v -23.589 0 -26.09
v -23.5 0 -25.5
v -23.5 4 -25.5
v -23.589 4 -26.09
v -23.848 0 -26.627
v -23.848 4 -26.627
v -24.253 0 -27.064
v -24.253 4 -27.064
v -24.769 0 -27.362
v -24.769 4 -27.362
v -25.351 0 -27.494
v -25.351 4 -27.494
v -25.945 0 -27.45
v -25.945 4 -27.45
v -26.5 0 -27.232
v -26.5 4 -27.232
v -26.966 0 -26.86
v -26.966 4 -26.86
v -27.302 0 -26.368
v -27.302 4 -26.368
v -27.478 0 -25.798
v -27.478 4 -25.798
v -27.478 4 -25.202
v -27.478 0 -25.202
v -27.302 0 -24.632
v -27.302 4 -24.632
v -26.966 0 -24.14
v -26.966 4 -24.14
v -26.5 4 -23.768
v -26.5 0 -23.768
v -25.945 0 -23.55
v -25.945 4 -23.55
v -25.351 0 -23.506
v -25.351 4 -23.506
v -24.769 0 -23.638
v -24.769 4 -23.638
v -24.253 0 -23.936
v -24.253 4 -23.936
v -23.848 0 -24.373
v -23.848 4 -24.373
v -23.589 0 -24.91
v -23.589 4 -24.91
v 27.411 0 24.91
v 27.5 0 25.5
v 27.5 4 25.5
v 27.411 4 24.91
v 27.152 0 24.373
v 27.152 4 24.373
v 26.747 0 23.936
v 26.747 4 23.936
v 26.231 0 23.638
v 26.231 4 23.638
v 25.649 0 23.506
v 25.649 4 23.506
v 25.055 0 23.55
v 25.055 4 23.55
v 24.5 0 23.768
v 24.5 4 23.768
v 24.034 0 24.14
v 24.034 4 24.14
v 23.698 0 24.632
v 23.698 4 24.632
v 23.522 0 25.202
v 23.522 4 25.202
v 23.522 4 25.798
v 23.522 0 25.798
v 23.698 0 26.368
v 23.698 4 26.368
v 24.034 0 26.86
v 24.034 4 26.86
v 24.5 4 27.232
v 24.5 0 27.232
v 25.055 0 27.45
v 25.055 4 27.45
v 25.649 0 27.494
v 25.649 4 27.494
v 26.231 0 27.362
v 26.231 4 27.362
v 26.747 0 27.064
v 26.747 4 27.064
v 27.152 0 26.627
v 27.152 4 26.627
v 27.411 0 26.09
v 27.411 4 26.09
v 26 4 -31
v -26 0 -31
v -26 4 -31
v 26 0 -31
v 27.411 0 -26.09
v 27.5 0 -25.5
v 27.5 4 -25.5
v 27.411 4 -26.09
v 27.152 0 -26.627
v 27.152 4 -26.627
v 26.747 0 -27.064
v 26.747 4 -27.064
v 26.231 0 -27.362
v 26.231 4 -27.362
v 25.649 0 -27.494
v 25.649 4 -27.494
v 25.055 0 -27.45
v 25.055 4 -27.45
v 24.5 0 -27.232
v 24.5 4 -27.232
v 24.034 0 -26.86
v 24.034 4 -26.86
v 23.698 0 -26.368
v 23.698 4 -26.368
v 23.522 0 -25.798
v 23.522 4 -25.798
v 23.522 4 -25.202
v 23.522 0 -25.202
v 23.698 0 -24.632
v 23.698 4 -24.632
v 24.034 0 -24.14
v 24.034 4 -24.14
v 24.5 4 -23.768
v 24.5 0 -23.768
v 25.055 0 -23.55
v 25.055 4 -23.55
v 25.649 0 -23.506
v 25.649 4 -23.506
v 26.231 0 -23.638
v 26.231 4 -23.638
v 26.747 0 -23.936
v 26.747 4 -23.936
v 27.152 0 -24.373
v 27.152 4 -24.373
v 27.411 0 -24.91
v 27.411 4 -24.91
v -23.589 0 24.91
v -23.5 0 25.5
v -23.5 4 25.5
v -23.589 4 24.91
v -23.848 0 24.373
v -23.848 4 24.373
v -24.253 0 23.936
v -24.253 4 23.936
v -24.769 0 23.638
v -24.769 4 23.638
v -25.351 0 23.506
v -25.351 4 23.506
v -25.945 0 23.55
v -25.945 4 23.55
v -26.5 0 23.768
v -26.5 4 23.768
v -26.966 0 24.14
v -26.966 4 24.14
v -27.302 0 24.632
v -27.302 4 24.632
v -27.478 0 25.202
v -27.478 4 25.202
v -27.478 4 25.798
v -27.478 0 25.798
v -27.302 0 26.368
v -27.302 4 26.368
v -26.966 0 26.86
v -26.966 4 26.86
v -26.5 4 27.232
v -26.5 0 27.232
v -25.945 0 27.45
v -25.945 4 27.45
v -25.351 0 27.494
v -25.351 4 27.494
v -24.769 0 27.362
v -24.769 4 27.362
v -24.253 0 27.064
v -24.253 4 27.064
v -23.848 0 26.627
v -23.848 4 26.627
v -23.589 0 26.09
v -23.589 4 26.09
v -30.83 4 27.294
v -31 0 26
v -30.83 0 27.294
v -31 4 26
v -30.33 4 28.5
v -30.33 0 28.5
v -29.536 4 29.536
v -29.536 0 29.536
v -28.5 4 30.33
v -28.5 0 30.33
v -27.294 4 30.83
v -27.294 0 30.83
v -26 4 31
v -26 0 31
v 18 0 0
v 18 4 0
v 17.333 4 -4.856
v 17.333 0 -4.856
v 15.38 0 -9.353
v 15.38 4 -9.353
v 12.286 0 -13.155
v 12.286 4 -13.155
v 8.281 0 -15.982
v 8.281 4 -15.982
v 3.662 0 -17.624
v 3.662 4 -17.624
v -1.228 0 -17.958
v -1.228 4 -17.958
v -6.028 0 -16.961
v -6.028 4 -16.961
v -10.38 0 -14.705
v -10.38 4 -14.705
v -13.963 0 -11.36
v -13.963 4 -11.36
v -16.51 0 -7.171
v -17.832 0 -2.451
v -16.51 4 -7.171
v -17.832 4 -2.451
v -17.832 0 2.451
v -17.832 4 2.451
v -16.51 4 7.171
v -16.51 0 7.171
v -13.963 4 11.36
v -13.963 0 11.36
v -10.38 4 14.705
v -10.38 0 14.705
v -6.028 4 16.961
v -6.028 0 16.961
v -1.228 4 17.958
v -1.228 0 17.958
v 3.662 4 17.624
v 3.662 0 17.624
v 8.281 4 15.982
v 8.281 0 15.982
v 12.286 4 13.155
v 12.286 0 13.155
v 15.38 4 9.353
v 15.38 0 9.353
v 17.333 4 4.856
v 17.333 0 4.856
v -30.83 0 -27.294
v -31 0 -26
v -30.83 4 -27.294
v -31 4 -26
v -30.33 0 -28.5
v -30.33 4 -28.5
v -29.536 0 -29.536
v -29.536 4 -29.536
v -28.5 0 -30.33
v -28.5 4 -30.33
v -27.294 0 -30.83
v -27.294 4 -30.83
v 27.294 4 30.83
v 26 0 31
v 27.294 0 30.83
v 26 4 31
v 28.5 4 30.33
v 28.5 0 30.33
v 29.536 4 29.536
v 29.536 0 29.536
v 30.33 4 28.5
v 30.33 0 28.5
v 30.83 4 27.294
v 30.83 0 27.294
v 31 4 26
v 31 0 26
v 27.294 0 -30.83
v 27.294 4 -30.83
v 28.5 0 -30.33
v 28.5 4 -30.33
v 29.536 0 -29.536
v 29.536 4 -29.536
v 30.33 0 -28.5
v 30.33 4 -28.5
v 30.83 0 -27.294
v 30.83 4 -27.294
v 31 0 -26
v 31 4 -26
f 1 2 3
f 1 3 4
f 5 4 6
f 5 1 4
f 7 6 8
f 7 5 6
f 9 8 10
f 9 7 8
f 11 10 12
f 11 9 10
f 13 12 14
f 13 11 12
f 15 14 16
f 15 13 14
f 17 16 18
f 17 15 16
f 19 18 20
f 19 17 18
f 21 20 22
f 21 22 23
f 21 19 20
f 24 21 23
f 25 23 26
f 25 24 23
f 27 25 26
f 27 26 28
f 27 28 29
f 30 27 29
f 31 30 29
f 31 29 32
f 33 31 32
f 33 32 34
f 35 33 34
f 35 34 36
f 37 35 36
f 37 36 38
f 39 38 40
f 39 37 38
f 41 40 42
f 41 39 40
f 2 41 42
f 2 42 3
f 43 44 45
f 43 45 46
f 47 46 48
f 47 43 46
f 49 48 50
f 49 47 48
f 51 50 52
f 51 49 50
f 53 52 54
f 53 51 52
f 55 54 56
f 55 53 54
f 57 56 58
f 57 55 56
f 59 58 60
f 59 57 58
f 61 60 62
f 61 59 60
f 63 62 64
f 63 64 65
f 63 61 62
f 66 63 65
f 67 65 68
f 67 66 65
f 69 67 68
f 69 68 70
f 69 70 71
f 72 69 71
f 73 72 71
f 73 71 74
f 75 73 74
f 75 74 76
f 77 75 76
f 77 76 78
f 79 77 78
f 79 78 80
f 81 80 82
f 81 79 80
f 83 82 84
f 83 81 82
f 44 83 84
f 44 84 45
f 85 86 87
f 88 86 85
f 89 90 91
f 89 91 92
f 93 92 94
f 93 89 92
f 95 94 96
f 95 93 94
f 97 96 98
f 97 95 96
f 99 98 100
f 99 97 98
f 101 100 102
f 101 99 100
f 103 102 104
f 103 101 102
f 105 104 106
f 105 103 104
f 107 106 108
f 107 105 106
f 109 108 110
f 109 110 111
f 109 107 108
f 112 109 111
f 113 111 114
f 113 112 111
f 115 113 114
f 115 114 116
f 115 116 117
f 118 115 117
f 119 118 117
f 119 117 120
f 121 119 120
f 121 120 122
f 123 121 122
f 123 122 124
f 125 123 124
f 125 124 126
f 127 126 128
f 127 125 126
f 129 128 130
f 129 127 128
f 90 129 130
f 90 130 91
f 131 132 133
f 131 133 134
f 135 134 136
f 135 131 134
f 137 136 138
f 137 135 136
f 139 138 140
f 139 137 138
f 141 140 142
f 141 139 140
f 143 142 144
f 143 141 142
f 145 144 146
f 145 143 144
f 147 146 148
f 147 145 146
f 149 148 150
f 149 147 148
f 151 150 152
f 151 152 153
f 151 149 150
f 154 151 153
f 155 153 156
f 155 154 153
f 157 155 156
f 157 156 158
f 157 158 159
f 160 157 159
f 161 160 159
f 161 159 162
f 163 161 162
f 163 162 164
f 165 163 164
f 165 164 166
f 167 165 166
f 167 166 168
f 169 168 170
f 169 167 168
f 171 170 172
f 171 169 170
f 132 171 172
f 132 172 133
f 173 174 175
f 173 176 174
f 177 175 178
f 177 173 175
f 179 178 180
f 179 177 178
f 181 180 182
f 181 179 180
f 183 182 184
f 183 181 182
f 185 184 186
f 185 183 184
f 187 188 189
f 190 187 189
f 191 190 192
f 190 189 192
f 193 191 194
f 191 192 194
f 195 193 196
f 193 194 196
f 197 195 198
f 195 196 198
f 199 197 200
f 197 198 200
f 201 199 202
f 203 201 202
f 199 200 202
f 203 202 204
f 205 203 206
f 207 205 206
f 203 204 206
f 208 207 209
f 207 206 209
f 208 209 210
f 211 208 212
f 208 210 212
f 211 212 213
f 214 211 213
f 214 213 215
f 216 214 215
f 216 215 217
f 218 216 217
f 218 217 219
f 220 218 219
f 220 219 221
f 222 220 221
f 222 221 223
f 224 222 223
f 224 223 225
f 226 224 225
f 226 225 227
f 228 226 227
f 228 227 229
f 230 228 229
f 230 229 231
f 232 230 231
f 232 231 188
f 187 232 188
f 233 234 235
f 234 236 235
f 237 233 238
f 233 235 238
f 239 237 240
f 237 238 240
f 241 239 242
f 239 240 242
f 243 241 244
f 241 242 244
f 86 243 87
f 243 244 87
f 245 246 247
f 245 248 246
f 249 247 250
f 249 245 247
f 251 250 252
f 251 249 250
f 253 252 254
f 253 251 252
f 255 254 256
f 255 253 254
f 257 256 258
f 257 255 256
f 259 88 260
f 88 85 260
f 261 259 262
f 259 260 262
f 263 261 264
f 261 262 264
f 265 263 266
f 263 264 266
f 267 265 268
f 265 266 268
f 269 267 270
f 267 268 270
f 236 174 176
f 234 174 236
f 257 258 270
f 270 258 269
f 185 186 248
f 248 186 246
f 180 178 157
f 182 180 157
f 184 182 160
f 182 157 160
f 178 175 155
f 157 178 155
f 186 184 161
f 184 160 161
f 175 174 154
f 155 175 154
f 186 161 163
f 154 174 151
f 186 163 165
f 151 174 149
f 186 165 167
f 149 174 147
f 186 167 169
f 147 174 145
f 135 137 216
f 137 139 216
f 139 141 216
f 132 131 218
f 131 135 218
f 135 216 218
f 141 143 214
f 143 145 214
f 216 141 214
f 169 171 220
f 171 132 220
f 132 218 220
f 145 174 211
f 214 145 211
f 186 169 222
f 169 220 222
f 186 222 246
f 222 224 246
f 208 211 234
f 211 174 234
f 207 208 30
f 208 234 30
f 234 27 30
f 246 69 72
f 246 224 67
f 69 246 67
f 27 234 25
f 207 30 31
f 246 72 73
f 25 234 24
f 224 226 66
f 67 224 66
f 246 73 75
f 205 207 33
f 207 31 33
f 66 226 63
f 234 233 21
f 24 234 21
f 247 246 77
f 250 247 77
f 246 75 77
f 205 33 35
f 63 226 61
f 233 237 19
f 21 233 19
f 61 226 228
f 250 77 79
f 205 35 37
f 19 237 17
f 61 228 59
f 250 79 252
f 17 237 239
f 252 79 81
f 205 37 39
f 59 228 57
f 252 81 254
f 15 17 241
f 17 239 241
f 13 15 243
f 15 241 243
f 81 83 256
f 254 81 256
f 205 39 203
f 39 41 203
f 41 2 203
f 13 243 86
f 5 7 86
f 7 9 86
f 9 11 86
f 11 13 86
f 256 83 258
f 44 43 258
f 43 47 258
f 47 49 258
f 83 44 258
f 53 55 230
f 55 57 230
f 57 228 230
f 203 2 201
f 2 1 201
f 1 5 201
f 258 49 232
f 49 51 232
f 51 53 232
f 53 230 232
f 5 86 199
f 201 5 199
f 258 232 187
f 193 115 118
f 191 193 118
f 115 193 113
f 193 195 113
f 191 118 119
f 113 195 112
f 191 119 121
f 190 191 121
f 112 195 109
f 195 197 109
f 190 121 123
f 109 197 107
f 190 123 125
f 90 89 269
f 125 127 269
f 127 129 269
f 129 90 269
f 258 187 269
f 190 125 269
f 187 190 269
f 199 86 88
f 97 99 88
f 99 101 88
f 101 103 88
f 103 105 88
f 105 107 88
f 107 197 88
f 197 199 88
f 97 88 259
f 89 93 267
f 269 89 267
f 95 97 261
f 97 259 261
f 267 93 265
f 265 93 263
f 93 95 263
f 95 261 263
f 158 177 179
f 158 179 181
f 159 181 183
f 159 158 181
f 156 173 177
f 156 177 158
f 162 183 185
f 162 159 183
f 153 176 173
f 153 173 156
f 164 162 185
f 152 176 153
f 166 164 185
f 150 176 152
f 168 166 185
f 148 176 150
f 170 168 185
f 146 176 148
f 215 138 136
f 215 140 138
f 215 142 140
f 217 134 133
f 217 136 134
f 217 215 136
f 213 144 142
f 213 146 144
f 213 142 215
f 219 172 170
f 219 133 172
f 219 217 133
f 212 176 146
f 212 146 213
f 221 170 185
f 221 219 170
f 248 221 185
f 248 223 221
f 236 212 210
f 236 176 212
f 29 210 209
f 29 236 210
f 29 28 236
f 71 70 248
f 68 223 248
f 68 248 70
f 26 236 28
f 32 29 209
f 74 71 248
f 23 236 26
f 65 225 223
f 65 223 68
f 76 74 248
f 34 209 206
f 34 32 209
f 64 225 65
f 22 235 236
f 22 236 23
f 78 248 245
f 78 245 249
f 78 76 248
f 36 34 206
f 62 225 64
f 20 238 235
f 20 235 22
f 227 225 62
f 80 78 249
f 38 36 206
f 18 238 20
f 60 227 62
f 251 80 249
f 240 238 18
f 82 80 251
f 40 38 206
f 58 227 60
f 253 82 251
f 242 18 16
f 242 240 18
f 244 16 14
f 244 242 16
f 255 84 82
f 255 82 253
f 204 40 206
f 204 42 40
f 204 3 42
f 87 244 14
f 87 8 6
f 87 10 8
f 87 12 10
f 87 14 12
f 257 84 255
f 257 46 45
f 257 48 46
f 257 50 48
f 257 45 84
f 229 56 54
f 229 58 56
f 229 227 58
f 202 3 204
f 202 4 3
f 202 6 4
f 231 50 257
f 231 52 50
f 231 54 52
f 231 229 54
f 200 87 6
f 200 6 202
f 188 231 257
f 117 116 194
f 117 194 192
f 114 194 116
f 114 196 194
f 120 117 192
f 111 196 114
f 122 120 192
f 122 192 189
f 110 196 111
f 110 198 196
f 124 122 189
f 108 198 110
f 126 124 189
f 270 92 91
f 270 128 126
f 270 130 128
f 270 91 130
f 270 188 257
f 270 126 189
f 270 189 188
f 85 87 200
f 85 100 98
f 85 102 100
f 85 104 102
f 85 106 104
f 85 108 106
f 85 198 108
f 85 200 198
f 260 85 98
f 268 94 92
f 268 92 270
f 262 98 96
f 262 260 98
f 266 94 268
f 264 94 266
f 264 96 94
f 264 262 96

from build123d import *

# Parameters (mm, degrees)
SKETCH1_W           = 62
SKETCH1_H           = 62
SKETCH1_R           = 2
BOSS_EXTRUDE1_DEPTH = 4
SKETCH2_R           = 18
CUT_EXTRUDE1_DEPTH  = 10
FILLET1_R           = 5


with BuildPart() as part:
    # Sketch1 → Boss-Extrude1 (new body)
    with BuildSketch(Plane(origin=(0, 0, 0), x_dir=(1, 0, 0), z_dir=(0, 1, 0))):
        Rectangle(SKETCH1_W, SKETCH1_H)
        with Locations((25.5, 25.5)):
            Circle(SKETCH1_R, mode=Mode.SUBTRACT)
        with Locations((-25.5, 25.5)):
            Circle(SKETCH1_R, mode=Mode.SUBTRACT)
        with Locations((25.5, -25.5)):
            Circle(SKETCH1_R, mode=Mode.SUBTRACT)
        with Locations((-25.5, -25.5)):
            Circle(SKETCH1_R, mode=Mode.SUBTRACT)
    extrude(amount=BOSS_EXTRUDE1_DEPTH)

    # Sketch2 → Cut-Extrude1 (cut)
    with BuildSketch(Plane(origin=(0, 4, 0), x_dir=(1, 0, 0), z_dir=(0, 1, 0))):
        Circle(SKETCH2_R)
    extrude(amount=-CUT_EXTRUDE1_DEPTH, mode=Mode.SUBTRACT)

    # Fillet1
    fillet1_edges = [part.edges().sort_by_distance(p)[0] for p in [
        (-31, 2, 31),
        (-31, 2, -31),
        (31, 2, -31),
        (31, 2, 31),
    ]]
    fillet(fillet1_edges, radius=FILLET1_R)


solid = part.part
